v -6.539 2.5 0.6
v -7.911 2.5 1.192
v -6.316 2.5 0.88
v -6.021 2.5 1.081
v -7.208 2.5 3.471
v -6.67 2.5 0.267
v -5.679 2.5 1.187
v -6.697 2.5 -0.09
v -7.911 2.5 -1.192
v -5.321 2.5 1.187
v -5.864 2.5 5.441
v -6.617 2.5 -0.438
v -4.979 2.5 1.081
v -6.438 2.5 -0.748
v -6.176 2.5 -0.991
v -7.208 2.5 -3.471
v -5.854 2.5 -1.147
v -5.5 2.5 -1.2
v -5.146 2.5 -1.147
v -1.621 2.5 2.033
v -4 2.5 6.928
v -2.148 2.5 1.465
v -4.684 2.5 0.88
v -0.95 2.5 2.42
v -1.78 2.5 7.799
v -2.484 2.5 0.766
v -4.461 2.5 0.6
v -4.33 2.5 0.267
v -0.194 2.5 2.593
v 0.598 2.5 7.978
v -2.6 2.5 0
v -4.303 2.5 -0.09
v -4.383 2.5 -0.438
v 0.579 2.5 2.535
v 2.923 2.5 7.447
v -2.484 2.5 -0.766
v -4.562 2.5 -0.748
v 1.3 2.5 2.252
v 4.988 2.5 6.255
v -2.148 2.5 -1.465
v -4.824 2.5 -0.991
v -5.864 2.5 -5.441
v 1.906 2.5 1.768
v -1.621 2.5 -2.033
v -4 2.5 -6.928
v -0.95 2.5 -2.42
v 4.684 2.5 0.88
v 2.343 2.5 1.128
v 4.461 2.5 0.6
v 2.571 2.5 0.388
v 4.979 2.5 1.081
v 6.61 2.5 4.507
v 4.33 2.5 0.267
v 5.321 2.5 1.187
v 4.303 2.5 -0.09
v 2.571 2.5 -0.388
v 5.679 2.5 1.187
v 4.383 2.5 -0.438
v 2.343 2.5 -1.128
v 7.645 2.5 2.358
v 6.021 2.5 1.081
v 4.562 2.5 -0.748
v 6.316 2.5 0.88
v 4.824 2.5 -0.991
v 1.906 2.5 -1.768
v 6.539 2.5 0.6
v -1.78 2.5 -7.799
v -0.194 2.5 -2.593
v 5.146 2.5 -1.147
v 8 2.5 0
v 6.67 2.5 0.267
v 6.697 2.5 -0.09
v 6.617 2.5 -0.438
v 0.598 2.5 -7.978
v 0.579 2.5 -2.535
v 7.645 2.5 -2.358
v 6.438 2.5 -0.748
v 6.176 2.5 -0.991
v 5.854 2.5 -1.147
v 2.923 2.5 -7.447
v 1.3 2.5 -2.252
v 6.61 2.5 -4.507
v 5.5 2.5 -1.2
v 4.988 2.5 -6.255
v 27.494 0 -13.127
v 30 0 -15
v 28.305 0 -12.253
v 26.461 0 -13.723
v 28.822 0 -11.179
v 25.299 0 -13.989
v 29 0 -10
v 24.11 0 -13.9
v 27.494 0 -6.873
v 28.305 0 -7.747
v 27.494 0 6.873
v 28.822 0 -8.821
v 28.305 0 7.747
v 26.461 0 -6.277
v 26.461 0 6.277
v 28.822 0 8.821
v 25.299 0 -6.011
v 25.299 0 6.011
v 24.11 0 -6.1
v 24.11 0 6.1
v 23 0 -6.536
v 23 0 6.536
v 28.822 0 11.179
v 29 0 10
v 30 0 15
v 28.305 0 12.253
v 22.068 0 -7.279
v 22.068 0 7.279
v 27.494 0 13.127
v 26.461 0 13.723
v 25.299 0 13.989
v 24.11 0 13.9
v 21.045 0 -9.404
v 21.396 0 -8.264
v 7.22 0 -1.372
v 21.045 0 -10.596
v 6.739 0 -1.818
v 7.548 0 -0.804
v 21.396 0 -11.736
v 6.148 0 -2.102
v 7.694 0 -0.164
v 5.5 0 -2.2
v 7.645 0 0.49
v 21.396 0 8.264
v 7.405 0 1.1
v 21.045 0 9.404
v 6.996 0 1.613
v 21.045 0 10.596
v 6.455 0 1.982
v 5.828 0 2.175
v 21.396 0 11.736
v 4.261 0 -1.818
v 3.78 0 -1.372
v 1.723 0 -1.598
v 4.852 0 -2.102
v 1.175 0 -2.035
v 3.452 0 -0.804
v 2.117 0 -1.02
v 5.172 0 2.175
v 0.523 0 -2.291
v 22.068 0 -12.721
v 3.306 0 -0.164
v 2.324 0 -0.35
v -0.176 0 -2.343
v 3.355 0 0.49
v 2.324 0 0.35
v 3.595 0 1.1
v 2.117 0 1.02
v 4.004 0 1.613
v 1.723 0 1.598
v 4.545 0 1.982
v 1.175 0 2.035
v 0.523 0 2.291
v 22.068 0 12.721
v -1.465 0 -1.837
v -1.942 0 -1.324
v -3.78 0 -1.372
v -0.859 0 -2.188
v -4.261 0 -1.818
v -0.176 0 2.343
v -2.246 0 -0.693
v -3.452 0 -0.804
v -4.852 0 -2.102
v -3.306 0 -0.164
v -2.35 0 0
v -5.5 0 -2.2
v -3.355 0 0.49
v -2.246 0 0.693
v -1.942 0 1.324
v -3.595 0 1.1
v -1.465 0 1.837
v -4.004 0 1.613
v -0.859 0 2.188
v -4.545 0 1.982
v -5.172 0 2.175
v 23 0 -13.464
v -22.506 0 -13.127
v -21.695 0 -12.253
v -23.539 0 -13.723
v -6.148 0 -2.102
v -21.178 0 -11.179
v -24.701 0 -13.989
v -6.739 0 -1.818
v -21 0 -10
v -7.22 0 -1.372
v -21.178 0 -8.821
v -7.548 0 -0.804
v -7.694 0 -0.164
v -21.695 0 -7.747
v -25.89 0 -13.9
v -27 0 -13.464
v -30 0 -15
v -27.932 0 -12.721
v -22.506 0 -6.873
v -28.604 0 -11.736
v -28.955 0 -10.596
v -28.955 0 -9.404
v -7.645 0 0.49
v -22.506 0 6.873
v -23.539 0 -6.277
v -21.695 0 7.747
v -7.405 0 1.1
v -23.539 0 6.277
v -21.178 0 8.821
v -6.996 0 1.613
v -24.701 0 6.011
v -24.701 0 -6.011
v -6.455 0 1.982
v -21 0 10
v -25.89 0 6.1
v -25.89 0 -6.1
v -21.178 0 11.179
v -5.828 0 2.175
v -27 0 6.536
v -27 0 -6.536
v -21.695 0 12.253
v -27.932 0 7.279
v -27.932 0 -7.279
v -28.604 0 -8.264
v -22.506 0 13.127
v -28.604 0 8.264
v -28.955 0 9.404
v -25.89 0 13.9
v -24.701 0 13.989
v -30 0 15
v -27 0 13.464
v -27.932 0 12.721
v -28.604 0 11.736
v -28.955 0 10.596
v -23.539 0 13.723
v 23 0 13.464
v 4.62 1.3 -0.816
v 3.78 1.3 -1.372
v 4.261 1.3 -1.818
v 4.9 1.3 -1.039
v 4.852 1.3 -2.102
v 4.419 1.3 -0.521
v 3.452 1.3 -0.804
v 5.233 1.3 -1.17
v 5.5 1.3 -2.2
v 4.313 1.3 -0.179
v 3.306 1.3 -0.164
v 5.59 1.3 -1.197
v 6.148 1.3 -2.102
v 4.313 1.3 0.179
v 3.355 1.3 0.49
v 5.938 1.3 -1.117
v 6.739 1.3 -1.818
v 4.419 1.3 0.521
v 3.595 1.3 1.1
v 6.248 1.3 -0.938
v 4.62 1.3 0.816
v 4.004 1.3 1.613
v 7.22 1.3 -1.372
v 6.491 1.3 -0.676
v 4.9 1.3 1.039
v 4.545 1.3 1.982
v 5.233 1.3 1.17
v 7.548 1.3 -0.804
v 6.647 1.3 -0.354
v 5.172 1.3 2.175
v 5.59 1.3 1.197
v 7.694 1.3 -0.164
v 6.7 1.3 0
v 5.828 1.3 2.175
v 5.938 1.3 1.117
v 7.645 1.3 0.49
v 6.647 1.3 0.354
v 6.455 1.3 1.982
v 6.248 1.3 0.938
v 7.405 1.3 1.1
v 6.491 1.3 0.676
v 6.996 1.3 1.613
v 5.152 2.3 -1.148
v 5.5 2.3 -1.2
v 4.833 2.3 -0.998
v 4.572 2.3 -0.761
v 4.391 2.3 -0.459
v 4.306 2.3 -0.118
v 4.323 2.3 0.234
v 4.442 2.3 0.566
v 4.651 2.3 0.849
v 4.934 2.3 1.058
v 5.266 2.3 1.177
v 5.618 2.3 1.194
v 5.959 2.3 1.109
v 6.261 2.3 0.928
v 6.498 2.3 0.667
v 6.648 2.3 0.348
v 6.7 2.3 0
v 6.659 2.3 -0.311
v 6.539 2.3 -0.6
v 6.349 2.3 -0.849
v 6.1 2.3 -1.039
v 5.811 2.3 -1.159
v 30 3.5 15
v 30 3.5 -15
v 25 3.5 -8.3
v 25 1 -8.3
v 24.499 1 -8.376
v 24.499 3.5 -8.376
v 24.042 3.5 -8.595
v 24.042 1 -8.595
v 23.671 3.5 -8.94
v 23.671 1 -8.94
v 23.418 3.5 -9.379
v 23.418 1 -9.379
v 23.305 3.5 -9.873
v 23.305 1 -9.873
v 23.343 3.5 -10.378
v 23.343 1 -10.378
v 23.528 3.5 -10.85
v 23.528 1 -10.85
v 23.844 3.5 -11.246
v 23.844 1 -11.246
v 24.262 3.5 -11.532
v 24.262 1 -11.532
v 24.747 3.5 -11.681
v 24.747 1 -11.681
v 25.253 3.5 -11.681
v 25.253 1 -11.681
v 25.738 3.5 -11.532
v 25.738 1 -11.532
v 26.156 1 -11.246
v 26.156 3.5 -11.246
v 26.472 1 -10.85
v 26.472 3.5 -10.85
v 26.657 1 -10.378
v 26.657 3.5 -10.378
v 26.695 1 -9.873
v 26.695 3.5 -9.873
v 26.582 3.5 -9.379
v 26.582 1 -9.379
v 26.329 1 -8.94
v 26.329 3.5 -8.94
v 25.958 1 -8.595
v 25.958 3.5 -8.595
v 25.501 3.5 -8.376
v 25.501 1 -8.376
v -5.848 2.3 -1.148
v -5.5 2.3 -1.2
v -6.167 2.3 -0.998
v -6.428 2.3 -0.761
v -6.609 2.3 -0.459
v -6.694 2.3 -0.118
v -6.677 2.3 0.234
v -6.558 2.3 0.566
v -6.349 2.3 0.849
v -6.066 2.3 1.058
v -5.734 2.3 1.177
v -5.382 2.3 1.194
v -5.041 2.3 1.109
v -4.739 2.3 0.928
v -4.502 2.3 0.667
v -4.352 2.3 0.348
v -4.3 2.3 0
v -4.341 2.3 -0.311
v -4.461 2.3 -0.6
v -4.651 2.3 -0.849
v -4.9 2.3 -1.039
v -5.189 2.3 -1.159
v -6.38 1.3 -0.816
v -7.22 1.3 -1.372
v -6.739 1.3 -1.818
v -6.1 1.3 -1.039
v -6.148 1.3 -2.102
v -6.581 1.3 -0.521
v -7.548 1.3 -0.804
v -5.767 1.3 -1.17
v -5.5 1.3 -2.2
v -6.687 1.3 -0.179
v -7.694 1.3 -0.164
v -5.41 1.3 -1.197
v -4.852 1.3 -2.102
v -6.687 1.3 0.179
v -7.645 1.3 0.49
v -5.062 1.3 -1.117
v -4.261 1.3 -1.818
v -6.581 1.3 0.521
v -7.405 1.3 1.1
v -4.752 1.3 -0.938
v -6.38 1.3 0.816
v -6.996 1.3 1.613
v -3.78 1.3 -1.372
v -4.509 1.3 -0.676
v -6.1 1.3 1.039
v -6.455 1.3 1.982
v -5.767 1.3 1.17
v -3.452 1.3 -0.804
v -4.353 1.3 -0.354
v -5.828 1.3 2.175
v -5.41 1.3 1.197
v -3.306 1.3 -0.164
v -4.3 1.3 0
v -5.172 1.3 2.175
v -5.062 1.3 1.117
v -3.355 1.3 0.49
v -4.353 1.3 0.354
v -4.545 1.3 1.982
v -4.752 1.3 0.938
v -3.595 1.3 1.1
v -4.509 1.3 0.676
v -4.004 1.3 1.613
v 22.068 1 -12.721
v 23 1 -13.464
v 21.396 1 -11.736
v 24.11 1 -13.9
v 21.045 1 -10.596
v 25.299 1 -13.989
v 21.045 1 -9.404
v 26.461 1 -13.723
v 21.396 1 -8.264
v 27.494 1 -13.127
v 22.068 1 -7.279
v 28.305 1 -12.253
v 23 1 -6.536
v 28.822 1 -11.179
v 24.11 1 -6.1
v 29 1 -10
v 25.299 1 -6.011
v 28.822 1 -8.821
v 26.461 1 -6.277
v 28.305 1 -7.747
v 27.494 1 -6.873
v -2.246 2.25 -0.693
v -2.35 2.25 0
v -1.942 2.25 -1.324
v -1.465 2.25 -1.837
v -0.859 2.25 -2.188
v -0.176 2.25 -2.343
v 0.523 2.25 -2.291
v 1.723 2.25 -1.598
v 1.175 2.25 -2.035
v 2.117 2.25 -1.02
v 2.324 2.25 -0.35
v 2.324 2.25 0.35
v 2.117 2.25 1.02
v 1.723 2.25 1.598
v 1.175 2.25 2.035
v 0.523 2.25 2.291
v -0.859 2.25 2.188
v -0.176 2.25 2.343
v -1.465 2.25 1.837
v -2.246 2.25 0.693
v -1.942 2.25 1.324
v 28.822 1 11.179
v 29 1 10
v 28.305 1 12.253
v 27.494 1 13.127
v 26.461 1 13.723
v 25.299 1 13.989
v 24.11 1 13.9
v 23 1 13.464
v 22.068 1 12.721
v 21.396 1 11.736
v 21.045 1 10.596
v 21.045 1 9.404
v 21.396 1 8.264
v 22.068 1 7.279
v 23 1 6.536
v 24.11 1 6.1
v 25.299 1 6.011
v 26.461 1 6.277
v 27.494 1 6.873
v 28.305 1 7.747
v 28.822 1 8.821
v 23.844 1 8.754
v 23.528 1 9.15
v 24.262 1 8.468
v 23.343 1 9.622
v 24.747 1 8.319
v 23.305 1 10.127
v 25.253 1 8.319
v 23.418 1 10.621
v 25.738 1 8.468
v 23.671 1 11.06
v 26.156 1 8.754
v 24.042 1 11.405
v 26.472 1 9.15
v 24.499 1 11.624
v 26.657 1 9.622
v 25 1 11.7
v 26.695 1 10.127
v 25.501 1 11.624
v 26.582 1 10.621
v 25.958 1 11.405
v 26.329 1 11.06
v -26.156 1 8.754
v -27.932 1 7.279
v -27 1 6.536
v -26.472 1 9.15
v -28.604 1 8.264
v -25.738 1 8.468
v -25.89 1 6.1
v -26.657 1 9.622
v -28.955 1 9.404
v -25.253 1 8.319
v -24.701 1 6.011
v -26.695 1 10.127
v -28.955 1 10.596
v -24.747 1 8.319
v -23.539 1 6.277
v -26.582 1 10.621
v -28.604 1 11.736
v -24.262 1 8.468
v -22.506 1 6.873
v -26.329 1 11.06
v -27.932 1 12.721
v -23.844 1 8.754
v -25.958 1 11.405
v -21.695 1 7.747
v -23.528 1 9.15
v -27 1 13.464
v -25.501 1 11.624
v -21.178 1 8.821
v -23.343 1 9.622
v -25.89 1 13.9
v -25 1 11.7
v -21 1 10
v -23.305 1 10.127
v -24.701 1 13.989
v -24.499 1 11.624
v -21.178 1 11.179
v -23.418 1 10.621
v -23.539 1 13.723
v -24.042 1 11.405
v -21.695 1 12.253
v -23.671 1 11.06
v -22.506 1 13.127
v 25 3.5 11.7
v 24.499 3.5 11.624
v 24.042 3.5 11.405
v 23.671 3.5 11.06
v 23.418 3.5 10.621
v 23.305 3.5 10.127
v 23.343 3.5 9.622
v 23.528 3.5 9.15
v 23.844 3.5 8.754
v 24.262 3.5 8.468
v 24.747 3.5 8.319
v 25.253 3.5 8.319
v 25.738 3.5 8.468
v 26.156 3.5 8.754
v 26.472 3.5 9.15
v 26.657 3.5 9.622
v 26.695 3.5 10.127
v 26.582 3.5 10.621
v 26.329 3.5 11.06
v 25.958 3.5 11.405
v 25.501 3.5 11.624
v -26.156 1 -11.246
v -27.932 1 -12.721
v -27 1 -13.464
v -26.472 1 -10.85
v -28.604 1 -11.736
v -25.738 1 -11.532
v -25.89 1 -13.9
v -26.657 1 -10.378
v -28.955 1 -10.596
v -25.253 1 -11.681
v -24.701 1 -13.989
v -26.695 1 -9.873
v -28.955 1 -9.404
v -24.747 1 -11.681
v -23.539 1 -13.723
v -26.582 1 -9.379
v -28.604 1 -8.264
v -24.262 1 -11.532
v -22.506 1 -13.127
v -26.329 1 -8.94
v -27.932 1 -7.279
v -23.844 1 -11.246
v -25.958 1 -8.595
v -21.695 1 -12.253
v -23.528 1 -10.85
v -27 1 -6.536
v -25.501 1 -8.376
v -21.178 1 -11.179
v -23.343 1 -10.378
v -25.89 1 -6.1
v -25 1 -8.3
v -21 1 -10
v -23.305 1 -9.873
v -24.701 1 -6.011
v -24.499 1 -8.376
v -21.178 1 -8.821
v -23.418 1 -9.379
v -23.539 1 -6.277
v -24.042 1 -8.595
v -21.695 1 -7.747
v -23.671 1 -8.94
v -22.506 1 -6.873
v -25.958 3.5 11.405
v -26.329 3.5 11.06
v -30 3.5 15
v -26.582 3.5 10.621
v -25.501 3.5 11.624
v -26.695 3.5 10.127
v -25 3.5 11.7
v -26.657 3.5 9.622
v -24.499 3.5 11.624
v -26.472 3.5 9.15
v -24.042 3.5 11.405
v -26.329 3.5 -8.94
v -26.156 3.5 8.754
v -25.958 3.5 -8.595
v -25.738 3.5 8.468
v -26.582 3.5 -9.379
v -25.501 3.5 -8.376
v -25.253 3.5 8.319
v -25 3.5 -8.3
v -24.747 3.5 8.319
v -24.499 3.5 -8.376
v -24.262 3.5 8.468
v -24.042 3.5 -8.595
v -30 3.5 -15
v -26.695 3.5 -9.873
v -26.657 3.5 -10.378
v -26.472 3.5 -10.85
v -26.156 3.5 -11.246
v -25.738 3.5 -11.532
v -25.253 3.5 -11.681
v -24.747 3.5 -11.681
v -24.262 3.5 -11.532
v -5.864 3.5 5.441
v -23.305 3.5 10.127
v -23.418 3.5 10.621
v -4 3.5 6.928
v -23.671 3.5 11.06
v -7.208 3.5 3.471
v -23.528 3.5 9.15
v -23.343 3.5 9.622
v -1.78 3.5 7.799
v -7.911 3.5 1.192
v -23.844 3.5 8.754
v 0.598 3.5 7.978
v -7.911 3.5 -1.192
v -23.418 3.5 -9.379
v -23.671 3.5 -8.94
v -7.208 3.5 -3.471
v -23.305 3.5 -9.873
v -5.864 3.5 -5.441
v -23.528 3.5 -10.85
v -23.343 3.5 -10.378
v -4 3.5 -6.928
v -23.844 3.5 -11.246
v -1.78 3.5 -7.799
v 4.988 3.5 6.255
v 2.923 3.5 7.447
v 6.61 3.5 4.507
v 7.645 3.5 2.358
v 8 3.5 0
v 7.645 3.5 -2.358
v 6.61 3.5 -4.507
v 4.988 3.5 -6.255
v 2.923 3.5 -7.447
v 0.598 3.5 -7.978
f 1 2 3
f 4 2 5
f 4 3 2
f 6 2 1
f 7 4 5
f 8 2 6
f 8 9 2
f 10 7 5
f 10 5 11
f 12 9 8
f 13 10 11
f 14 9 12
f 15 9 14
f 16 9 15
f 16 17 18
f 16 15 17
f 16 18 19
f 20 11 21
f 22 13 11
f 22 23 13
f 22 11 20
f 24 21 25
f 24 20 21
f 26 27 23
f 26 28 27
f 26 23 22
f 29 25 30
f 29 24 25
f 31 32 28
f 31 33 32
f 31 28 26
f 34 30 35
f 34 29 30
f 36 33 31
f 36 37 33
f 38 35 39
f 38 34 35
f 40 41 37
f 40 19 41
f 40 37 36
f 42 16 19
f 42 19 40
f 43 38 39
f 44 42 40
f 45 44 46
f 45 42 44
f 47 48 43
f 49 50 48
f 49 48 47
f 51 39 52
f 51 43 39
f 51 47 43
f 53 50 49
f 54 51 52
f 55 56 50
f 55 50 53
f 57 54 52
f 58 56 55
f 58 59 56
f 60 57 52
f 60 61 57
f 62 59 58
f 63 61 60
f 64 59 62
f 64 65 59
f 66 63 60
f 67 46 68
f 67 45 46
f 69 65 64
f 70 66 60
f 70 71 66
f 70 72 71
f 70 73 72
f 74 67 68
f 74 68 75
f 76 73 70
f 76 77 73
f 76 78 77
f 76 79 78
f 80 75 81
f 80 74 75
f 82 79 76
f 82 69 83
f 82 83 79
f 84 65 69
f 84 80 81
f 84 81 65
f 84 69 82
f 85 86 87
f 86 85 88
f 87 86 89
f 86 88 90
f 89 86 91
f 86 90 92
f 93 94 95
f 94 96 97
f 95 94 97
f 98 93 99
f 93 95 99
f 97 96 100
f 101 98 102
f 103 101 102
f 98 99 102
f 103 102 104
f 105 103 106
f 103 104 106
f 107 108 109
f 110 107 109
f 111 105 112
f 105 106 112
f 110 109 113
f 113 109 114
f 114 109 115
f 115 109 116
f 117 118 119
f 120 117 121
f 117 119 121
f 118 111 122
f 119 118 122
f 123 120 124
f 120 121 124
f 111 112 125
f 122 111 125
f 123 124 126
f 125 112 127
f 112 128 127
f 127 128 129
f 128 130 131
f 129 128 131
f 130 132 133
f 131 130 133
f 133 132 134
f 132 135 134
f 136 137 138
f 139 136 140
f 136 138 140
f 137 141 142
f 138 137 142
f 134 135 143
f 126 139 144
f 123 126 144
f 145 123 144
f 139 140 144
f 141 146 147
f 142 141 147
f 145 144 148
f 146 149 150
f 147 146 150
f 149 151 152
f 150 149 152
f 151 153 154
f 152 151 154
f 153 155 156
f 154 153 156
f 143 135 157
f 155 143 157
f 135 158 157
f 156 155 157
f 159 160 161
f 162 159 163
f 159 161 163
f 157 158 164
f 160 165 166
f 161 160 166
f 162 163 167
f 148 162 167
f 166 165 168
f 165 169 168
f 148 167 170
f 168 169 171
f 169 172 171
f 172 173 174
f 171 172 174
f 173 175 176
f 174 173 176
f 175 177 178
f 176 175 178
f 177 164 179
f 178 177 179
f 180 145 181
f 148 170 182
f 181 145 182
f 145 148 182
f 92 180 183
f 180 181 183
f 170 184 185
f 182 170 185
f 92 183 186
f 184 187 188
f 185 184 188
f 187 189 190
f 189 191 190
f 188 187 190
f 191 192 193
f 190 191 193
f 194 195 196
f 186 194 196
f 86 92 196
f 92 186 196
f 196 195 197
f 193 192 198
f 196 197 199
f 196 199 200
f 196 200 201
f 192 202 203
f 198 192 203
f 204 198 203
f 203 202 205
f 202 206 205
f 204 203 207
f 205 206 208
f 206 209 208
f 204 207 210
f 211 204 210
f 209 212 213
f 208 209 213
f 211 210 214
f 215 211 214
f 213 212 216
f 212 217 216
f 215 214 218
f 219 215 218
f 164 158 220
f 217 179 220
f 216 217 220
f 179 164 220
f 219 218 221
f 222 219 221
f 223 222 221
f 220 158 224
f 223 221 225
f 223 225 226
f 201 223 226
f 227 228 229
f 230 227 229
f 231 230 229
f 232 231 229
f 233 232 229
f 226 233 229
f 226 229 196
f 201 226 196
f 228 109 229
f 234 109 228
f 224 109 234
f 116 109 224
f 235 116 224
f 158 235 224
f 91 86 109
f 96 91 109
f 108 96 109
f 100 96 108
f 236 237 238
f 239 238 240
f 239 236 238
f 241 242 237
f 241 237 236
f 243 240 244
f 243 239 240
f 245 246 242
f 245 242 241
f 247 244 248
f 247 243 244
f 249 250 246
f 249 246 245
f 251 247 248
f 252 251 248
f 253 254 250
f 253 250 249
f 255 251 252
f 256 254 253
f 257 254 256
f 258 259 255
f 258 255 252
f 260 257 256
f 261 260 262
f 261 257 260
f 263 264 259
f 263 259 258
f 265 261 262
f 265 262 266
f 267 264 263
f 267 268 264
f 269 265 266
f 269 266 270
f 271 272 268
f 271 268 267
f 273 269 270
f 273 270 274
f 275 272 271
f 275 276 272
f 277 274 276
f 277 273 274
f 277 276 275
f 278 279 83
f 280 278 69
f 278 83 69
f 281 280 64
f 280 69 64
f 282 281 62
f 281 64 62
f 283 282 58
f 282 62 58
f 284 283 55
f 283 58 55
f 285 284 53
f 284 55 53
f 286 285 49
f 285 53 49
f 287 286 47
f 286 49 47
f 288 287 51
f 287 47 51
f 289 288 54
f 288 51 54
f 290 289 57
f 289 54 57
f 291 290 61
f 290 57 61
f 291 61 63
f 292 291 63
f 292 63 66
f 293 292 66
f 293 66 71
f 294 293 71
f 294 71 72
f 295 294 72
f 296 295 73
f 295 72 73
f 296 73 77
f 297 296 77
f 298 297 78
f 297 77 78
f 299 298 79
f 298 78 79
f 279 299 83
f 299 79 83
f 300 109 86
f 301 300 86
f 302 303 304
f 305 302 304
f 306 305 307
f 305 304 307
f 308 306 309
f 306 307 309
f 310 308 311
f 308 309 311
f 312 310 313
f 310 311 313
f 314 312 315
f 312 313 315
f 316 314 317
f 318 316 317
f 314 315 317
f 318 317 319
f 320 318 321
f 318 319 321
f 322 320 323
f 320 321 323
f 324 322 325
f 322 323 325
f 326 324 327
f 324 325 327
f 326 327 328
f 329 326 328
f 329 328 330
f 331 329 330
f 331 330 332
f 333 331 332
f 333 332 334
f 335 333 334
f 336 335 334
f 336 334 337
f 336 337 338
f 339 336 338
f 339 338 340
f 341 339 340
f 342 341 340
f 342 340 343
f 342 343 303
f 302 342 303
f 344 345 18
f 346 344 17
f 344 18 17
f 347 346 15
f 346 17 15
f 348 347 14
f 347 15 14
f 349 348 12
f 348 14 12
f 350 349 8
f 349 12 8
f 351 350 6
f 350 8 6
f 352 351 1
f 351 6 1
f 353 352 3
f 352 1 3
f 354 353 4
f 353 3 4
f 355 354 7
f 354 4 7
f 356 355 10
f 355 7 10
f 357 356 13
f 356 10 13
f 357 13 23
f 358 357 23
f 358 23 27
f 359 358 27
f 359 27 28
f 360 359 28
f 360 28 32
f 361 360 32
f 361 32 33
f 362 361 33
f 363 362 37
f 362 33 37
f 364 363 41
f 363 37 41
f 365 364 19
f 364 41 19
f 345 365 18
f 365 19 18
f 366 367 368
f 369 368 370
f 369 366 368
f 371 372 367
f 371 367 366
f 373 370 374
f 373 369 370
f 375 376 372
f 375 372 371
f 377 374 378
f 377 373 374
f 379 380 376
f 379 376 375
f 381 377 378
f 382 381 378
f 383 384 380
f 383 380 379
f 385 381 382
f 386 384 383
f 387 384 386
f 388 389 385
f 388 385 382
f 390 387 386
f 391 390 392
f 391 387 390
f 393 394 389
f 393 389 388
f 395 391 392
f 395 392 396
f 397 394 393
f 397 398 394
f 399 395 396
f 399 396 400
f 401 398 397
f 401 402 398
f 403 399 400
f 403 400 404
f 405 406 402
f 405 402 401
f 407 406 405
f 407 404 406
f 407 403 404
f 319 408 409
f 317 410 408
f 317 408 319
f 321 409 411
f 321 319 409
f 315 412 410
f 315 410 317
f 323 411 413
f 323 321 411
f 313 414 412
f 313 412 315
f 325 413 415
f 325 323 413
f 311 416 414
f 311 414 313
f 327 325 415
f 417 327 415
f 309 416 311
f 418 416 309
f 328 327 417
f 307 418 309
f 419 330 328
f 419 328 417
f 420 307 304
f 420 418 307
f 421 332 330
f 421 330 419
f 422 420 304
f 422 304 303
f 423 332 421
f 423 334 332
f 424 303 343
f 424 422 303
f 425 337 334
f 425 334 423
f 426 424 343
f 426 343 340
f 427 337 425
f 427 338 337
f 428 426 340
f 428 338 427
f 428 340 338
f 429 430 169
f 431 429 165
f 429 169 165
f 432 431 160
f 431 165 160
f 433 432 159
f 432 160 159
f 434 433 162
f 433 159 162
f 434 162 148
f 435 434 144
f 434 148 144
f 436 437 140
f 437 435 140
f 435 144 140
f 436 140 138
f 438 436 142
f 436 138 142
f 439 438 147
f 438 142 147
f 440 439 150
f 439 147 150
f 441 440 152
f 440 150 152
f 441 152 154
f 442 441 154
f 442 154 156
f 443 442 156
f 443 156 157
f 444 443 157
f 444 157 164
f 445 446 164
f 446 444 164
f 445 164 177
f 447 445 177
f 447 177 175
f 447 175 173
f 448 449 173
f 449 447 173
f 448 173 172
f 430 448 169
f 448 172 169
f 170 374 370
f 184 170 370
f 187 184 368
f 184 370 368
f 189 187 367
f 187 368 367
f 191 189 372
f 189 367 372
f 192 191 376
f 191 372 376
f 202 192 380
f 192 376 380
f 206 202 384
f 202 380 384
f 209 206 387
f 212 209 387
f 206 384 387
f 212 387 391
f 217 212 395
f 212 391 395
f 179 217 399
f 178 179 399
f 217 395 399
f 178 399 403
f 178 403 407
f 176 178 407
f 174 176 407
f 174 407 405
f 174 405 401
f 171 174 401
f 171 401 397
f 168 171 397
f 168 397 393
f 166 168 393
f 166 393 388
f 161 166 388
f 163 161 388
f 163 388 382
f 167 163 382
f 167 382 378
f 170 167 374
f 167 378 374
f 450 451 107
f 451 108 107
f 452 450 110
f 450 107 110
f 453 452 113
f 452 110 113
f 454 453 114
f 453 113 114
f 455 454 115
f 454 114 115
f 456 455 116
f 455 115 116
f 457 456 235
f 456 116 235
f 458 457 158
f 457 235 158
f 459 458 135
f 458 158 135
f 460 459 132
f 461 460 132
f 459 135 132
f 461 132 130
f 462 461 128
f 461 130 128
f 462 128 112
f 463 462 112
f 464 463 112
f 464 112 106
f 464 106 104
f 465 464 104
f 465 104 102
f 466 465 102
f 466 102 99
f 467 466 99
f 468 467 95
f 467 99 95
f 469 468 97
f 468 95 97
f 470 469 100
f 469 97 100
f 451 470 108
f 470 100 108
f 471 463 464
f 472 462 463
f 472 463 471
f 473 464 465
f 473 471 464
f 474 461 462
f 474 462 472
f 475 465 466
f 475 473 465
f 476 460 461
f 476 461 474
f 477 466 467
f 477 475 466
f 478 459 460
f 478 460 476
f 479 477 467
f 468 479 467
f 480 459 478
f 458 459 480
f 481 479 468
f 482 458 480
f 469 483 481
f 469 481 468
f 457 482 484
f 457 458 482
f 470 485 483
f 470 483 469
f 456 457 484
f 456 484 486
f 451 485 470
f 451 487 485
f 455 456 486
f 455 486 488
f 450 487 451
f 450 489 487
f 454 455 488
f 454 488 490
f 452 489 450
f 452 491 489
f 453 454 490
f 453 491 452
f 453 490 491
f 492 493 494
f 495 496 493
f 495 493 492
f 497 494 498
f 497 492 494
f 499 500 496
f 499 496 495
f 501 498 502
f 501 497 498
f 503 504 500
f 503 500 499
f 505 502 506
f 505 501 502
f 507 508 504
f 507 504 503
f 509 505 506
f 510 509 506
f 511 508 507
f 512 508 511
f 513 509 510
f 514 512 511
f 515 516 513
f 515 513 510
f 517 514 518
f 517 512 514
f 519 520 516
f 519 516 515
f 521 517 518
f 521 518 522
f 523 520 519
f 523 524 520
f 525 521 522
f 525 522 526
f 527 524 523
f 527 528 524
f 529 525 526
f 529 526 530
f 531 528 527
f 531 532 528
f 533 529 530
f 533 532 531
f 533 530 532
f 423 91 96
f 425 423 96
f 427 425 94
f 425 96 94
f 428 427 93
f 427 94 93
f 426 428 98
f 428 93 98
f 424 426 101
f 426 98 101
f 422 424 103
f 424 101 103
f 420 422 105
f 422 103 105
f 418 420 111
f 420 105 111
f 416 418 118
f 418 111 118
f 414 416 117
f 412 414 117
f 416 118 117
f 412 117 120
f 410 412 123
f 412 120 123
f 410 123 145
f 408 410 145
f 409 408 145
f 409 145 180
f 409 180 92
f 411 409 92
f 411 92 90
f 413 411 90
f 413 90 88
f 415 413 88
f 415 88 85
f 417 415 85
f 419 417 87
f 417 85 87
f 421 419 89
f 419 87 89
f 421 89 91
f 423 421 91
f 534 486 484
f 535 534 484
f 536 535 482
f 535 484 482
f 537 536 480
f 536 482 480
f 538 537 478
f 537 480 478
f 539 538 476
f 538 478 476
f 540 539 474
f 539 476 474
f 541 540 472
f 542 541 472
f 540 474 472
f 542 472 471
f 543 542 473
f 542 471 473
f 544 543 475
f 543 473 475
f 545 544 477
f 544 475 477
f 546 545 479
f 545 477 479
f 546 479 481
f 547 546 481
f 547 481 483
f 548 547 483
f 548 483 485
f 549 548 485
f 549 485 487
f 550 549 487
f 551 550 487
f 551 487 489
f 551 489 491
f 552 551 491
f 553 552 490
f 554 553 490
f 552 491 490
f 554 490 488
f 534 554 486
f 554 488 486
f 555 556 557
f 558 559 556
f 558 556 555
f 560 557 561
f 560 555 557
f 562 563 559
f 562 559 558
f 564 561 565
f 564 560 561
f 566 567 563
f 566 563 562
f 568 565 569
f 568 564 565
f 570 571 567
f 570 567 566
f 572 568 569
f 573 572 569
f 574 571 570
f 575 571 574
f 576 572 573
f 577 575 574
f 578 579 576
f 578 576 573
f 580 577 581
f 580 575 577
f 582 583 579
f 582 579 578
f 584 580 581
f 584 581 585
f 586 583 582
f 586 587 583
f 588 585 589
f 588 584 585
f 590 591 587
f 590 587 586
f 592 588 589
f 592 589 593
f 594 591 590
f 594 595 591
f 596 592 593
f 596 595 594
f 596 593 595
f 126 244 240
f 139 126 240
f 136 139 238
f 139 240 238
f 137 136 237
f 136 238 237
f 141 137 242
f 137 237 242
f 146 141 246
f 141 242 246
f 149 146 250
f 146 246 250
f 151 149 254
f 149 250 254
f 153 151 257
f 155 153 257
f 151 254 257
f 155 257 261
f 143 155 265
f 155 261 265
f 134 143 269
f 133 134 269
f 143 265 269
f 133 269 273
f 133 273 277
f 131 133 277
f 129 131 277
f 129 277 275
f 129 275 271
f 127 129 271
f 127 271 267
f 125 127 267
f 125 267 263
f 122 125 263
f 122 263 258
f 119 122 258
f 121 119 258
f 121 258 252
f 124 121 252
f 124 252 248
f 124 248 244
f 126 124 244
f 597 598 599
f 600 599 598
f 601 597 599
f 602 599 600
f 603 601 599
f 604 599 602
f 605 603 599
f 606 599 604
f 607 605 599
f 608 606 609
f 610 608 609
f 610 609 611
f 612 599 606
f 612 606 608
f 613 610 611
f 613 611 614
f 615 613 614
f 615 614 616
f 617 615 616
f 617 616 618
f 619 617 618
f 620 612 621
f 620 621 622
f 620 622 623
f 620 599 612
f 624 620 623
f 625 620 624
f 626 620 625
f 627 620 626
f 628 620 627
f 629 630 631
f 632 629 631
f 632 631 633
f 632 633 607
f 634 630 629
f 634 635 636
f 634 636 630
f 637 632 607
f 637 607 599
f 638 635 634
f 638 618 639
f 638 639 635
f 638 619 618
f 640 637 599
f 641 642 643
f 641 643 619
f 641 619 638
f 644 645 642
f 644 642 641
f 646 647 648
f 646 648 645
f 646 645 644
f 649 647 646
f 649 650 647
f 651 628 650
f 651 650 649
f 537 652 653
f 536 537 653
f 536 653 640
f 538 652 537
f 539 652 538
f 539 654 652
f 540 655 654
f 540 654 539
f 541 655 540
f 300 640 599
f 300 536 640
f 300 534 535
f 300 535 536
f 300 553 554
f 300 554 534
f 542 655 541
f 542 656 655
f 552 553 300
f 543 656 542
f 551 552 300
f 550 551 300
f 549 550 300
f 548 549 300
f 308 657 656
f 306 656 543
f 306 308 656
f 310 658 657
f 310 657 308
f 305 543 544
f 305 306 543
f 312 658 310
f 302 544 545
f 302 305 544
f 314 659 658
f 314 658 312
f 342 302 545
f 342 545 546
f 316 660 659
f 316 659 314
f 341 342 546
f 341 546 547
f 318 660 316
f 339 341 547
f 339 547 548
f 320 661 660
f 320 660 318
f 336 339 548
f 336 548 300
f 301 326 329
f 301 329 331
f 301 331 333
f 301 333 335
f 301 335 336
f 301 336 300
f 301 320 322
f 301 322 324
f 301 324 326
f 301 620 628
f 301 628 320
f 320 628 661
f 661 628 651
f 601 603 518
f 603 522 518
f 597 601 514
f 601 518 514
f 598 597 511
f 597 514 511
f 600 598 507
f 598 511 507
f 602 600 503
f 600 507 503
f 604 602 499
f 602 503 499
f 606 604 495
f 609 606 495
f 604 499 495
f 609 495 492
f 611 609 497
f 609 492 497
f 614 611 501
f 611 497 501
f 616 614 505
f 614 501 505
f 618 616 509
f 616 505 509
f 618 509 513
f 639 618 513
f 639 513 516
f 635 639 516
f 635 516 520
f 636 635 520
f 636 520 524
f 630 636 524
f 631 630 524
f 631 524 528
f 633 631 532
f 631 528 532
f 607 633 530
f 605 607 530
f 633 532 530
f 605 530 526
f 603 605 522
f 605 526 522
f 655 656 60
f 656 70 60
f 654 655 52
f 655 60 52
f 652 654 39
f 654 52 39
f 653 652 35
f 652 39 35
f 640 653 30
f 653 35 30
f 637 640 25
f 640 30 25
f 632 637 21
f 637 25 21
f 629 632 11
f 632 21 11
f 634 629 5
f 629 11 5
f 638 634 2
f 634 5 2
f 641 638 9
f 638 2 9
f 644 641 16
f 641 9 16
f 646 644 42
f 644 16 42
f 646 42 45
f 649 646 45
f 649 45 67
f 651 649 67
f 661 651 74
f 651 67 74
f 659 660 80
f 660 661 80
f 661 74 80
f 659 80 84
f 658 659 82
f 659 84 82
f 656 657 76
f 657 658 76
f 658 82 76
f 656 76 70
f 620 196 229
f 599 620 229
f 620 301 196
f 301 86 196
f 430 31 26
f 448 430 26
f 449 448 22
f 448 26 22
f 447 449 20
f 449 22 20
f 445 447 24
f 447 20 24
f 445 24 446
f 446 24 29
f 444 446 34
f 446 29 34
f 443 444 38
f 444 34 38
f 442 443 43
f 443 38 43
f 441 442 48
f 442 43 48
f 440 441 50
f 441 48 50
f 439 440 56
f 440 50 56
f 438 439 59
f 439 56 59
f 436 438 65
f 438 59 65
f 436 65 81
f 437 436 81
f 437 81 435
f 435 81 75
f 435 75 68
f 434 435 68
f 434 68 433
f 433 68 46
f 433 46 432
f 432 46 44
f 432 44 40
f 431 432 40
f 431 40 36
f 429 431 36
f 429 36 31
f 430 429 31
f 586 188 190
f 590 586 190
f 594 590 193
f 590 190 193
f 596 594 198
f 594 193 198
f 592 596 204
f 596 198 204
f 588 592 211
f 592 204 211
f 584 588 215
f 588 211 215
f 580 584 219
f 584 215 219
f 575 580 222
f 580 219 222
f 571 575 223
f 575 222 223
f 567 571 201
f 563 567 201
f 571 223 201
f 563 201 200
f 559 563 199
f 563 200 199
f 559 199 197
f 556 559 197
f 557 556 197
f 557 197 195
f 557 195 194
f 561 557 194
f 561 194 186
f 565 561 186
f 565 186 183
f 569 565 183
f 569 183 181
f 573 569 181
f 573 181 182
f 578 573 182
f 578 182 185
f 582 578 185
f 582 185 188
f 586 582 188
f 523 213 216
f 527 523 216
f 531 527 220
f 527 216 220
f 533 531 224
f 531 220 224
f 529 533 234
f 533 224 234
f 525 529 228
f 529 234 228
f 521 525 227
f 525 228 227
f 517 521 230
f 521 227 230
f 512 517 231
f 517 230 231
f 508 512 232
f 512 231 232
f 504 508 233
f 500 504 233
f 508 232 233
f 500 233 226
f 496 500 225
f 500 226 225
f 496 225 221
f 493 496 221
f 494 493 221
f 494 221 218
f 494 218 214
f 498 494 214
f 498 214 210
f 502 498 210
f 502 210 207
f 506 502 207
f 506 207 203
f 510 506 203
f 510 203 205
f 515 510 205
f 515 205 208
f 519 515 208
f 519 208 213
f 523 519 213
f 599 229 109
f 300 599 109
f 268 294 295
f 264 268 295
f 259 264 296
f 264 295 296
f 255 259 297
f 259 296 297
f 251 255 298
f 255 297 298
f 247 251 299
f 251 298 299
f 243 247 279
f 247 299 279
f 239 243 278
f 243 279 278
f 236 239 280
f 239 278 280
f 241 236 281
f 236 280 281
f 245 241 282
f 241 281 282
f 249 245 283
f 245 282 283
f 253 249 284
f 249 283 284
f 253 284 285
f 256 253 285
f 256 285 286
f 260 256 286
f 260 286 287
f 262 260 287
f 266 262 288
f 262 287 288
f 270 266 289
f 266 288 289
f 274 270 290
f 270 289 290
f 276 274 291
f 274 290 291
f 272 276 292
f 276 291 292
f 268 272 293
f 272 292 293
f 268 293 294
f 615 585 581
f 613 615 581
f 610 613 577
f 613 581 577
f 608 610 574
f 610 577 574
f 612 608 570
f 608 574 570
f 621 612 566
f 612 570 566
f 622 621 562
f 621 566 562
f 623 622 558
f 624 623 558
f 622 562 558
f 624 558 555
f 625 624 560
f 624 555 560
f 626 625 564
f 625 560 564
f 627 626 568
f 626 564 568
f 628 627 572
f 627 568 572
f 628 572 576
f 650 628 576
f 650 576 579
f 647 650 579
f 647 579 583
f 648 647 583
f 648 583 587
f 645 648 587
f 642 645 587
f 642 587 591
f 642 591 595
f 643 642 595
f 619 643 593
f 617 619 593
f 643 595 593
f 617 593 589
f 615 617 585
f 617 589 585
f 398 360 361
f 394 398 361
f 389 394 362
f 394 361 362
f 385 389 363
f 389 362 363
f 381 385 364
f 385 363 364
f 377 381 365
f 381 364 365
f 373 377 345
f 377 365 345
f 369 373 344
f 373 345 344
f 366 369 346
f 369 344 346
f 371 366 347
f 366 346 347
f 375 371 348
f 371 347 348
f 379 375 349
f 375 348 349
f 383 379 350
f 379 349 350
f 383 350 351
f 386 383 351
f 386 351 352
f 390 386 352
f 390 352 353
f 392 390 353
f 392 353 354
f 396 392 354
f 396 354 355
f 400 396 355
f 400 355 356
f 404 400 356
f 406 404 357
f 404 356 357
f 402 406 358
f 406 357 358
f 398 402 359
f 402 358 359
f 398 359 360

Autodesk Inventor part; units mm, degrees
ref_plane "YZ Plane" through (0, 0, 0) normal (1, 0, 0) x (0, 1, 0)
ref_plane "XZ Plane" through (0, 0, 0) normal (0, 1, 0) x (-1, 0, 0)
ref_plane "XY Plane" through (0, 0, 0) normal (0, 0, 1) x (1, 0, 0)
sketch "Sketch1" plane through (0, 0, 0) normal (0, 1, 0) x (-1, 0, 0)
  circle A0 centre (0, 0) radius 8 construction
  circle A1 centre (0, 0) radius 2.35
  line L0 (30, 15) -> (-30, 15)
  line L1 (-30, 15) -> (-30, -15)
  line L2 (-30, -15) -> (30, -15)
  line L3 (30, -15) -> (30, 15)
  line L4 (0, -21) -> (0, 21) projected
  point P0 (0, 15)
  dimension "d0" = 16
  dimension "d3" = 4.7
  dimension "d4" = 60
  dimension "d5" = 30
  dimension "d6" = 15
extrude "Extrusion1" add sketch "Sketch1" along normal blind 2.5 contours A1 L4 L0 L3 L2 | A1 L4 L2 L1 L0
sketch "Sketch2" plane through (0, 2.5, 0) normal (0, 1, 0) x (1, 0, 0)
  circle A0 centre (0, 0) radius 3.5
  line L0 (-30, 15) -> (-30, -15) projected
  line L1 (-30, -15) -> (30, -15) projected
  line L2 (30, -15) -> (30, 15) projected
  line L3 (30, 15) -> (-30, 15) projected
  circle A1 centre (0, 0) radius 2.35 projected
  dimension "d9" = 7
extrude "Extrusion2" add sketch "Sketch2" along normal blind 1 contours L3 L2 L1 L0
sketch "Sketch4" plane through (0, 0, 0) normal (0, -1, 0) x (1, 0, 0)
  line L0 (-42, 0) -> (42, 0) projected
  point P0 (0, 0)
  point P1 (-5.5, 0)
  point P2 (5.5, 0)
  dimension "d18" = 360
  dimension "d20" = 5.5
hole "Hole1" at (-5.5, 0, 0) at (5.5, 0, 0) direction (0, 1, 0) diameter 2.4 end through all counterbore diameter 4.4 counterbore depth 2.3 clearance for "Socket Head Cap Screw ISO 4762" size "M2" standard "ISO"
sketch "Sketch5" plane through (0, 2.5, 0) normal (0, 1, 0) x (1, 0, 0)
  circle A0 centre (0, 0) radius 8
  dimension "d30" = 16
extrude "Extrusion3" cut sketch "Sketch5" along normal blind 1
sketch "Sketch7" plane through (0, 0, 0) normal (0, -1, 0) x (1, 0, 0)
  circle A0 centre (-25, 10) radius 4
  line L0 (-30, 15) -> (30, 15) projected
  line L1 (-30, -15) -> (-30, 15) projected
  circle A1 centre (25, 10) radius 4
  circle A2 centre (-25, -10) radius 4
  circle A3 centre (25, -10) radius 4
  point P0 (0, 0)
  dimension "d34" = 8
  dimension "d35" = 5
  dimension "d36" = 5
  dimension "d39" = 50
  dimension "d42" = 20
extrude "Extrusion4" cut sketch "Sketch7" against normal blind 1
chamfer "Chamfer1" distance 0.25 angle 45 1 edges at (2.35, 2.5, 0)
sketch "Sketch9" plane through (0, 3.5, 0) normal (0, 1, 0) x (1, 0, 0)
  circle A0 centre (-25, -10) radius 4 construction
  point P0 (0, 0)
hole "Hole2" at (-25, 3.5, 10) direction (0, -1, 0) diameter 3.4 end through all clearance for "Socket Head Cap Screw ISO 4762" size "M3" standard "ISO"
pattern_linear "Rectangular Pattern1" count 2 spacing 20 along (0, 0, -1) count 2 spacing 50 along (1, 0, 0) of "Hole2"
sketch "Sketch10" plane through (5.5, 2.3, 0) normal (0, -1, 0) x (1, 0, 0)
  circle A0 centre (0, 0) radius 2.2 projected
  circle A1 centre (0, 0) radius 1.2 projected
  circle A2 centre (-11, 0) radius 2.2 projected
  circle A3 centre (-11, 0) radius 1.2 projected
  point P0 (-5.5, 0)
extrude "Extrusion6" add sketch "Sketch10" along normal blind 1
properties part number "motor mount plate"
